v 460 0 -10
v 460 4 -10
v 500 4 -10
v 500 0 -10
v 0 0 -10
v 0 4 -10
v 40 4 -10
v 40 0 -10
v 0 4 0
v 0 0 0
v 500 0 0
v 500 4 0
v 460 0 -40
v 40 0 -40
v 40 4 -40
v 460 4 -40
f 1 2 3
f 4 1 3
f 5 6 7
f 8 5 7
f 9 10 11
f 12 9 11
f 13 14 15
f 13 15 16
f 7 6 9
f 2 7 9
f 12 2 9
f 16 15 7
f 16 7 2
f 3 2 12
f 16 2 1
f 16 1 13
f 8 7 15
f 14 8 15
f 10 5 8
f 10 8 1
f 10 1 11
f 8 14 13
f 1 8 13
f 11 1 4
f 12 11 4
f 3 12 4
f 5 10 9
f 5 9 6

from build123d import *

# Parameters (mm, degrees)
SKETCH_1_W          = 500
SKETCH_1_H          = 40
EXTRUDE_1_DEPTH     = 4
SKETCH_3_W          = 40
SKETCH_3_H          = 30
CUT_EXTRUDE_1_DEPTH = 502.61339695
SKETCH_4_W          = 40
SKETCH_4_H          = 30
CUT_EXTRUDE_2_DEPTH = 502.61339695


with BuildPart() as part:
    # Эскиз1 → Бобышка-Вытянуть1 (new body)
    with BuildSketch(Plane(origin=(0, 0, 0), x_dir=(1, 0, 0), z_dir=(0, 1, 0))):
        with Locations((250, 20)):
            Rectangle(SKETCH_1_W, SKETCH_1_H)
    extrude(amount=EXTRUDE_1_DEPTH)

    # Эскиз3 → Вырез-Вытянуть1 (cut, through all)
    with BuildSketch(Plane(origin=(0, 4, 0), x_dir=(1, 0, 0), z_dir=(0, 1, 0))):
        with Locations((20, 25)):
            Rectangle(SKETCH_3_W, SKETCH_3_H)
    extrude(amount=-CUT_EXTRUDE_1_DEPTH, mode=Mode.SUBTRACT)

    # Эскиз4 → Вырез-Вытянуть2 (cut, through all)
    with BuildSketch(Plane(origin=(0, 4, 0), x_dir=(1, 0, 0), z_dir=(0, 1, 0))):
        with Locations((480, 25)):
            Rectangle(SKETCH_4_W, SKETCH_4_H)
    extrude(amount=-CUT_EXTRUDE_2_DEPTH, mode=Mode.SUBTRACT)


solid = part.part
